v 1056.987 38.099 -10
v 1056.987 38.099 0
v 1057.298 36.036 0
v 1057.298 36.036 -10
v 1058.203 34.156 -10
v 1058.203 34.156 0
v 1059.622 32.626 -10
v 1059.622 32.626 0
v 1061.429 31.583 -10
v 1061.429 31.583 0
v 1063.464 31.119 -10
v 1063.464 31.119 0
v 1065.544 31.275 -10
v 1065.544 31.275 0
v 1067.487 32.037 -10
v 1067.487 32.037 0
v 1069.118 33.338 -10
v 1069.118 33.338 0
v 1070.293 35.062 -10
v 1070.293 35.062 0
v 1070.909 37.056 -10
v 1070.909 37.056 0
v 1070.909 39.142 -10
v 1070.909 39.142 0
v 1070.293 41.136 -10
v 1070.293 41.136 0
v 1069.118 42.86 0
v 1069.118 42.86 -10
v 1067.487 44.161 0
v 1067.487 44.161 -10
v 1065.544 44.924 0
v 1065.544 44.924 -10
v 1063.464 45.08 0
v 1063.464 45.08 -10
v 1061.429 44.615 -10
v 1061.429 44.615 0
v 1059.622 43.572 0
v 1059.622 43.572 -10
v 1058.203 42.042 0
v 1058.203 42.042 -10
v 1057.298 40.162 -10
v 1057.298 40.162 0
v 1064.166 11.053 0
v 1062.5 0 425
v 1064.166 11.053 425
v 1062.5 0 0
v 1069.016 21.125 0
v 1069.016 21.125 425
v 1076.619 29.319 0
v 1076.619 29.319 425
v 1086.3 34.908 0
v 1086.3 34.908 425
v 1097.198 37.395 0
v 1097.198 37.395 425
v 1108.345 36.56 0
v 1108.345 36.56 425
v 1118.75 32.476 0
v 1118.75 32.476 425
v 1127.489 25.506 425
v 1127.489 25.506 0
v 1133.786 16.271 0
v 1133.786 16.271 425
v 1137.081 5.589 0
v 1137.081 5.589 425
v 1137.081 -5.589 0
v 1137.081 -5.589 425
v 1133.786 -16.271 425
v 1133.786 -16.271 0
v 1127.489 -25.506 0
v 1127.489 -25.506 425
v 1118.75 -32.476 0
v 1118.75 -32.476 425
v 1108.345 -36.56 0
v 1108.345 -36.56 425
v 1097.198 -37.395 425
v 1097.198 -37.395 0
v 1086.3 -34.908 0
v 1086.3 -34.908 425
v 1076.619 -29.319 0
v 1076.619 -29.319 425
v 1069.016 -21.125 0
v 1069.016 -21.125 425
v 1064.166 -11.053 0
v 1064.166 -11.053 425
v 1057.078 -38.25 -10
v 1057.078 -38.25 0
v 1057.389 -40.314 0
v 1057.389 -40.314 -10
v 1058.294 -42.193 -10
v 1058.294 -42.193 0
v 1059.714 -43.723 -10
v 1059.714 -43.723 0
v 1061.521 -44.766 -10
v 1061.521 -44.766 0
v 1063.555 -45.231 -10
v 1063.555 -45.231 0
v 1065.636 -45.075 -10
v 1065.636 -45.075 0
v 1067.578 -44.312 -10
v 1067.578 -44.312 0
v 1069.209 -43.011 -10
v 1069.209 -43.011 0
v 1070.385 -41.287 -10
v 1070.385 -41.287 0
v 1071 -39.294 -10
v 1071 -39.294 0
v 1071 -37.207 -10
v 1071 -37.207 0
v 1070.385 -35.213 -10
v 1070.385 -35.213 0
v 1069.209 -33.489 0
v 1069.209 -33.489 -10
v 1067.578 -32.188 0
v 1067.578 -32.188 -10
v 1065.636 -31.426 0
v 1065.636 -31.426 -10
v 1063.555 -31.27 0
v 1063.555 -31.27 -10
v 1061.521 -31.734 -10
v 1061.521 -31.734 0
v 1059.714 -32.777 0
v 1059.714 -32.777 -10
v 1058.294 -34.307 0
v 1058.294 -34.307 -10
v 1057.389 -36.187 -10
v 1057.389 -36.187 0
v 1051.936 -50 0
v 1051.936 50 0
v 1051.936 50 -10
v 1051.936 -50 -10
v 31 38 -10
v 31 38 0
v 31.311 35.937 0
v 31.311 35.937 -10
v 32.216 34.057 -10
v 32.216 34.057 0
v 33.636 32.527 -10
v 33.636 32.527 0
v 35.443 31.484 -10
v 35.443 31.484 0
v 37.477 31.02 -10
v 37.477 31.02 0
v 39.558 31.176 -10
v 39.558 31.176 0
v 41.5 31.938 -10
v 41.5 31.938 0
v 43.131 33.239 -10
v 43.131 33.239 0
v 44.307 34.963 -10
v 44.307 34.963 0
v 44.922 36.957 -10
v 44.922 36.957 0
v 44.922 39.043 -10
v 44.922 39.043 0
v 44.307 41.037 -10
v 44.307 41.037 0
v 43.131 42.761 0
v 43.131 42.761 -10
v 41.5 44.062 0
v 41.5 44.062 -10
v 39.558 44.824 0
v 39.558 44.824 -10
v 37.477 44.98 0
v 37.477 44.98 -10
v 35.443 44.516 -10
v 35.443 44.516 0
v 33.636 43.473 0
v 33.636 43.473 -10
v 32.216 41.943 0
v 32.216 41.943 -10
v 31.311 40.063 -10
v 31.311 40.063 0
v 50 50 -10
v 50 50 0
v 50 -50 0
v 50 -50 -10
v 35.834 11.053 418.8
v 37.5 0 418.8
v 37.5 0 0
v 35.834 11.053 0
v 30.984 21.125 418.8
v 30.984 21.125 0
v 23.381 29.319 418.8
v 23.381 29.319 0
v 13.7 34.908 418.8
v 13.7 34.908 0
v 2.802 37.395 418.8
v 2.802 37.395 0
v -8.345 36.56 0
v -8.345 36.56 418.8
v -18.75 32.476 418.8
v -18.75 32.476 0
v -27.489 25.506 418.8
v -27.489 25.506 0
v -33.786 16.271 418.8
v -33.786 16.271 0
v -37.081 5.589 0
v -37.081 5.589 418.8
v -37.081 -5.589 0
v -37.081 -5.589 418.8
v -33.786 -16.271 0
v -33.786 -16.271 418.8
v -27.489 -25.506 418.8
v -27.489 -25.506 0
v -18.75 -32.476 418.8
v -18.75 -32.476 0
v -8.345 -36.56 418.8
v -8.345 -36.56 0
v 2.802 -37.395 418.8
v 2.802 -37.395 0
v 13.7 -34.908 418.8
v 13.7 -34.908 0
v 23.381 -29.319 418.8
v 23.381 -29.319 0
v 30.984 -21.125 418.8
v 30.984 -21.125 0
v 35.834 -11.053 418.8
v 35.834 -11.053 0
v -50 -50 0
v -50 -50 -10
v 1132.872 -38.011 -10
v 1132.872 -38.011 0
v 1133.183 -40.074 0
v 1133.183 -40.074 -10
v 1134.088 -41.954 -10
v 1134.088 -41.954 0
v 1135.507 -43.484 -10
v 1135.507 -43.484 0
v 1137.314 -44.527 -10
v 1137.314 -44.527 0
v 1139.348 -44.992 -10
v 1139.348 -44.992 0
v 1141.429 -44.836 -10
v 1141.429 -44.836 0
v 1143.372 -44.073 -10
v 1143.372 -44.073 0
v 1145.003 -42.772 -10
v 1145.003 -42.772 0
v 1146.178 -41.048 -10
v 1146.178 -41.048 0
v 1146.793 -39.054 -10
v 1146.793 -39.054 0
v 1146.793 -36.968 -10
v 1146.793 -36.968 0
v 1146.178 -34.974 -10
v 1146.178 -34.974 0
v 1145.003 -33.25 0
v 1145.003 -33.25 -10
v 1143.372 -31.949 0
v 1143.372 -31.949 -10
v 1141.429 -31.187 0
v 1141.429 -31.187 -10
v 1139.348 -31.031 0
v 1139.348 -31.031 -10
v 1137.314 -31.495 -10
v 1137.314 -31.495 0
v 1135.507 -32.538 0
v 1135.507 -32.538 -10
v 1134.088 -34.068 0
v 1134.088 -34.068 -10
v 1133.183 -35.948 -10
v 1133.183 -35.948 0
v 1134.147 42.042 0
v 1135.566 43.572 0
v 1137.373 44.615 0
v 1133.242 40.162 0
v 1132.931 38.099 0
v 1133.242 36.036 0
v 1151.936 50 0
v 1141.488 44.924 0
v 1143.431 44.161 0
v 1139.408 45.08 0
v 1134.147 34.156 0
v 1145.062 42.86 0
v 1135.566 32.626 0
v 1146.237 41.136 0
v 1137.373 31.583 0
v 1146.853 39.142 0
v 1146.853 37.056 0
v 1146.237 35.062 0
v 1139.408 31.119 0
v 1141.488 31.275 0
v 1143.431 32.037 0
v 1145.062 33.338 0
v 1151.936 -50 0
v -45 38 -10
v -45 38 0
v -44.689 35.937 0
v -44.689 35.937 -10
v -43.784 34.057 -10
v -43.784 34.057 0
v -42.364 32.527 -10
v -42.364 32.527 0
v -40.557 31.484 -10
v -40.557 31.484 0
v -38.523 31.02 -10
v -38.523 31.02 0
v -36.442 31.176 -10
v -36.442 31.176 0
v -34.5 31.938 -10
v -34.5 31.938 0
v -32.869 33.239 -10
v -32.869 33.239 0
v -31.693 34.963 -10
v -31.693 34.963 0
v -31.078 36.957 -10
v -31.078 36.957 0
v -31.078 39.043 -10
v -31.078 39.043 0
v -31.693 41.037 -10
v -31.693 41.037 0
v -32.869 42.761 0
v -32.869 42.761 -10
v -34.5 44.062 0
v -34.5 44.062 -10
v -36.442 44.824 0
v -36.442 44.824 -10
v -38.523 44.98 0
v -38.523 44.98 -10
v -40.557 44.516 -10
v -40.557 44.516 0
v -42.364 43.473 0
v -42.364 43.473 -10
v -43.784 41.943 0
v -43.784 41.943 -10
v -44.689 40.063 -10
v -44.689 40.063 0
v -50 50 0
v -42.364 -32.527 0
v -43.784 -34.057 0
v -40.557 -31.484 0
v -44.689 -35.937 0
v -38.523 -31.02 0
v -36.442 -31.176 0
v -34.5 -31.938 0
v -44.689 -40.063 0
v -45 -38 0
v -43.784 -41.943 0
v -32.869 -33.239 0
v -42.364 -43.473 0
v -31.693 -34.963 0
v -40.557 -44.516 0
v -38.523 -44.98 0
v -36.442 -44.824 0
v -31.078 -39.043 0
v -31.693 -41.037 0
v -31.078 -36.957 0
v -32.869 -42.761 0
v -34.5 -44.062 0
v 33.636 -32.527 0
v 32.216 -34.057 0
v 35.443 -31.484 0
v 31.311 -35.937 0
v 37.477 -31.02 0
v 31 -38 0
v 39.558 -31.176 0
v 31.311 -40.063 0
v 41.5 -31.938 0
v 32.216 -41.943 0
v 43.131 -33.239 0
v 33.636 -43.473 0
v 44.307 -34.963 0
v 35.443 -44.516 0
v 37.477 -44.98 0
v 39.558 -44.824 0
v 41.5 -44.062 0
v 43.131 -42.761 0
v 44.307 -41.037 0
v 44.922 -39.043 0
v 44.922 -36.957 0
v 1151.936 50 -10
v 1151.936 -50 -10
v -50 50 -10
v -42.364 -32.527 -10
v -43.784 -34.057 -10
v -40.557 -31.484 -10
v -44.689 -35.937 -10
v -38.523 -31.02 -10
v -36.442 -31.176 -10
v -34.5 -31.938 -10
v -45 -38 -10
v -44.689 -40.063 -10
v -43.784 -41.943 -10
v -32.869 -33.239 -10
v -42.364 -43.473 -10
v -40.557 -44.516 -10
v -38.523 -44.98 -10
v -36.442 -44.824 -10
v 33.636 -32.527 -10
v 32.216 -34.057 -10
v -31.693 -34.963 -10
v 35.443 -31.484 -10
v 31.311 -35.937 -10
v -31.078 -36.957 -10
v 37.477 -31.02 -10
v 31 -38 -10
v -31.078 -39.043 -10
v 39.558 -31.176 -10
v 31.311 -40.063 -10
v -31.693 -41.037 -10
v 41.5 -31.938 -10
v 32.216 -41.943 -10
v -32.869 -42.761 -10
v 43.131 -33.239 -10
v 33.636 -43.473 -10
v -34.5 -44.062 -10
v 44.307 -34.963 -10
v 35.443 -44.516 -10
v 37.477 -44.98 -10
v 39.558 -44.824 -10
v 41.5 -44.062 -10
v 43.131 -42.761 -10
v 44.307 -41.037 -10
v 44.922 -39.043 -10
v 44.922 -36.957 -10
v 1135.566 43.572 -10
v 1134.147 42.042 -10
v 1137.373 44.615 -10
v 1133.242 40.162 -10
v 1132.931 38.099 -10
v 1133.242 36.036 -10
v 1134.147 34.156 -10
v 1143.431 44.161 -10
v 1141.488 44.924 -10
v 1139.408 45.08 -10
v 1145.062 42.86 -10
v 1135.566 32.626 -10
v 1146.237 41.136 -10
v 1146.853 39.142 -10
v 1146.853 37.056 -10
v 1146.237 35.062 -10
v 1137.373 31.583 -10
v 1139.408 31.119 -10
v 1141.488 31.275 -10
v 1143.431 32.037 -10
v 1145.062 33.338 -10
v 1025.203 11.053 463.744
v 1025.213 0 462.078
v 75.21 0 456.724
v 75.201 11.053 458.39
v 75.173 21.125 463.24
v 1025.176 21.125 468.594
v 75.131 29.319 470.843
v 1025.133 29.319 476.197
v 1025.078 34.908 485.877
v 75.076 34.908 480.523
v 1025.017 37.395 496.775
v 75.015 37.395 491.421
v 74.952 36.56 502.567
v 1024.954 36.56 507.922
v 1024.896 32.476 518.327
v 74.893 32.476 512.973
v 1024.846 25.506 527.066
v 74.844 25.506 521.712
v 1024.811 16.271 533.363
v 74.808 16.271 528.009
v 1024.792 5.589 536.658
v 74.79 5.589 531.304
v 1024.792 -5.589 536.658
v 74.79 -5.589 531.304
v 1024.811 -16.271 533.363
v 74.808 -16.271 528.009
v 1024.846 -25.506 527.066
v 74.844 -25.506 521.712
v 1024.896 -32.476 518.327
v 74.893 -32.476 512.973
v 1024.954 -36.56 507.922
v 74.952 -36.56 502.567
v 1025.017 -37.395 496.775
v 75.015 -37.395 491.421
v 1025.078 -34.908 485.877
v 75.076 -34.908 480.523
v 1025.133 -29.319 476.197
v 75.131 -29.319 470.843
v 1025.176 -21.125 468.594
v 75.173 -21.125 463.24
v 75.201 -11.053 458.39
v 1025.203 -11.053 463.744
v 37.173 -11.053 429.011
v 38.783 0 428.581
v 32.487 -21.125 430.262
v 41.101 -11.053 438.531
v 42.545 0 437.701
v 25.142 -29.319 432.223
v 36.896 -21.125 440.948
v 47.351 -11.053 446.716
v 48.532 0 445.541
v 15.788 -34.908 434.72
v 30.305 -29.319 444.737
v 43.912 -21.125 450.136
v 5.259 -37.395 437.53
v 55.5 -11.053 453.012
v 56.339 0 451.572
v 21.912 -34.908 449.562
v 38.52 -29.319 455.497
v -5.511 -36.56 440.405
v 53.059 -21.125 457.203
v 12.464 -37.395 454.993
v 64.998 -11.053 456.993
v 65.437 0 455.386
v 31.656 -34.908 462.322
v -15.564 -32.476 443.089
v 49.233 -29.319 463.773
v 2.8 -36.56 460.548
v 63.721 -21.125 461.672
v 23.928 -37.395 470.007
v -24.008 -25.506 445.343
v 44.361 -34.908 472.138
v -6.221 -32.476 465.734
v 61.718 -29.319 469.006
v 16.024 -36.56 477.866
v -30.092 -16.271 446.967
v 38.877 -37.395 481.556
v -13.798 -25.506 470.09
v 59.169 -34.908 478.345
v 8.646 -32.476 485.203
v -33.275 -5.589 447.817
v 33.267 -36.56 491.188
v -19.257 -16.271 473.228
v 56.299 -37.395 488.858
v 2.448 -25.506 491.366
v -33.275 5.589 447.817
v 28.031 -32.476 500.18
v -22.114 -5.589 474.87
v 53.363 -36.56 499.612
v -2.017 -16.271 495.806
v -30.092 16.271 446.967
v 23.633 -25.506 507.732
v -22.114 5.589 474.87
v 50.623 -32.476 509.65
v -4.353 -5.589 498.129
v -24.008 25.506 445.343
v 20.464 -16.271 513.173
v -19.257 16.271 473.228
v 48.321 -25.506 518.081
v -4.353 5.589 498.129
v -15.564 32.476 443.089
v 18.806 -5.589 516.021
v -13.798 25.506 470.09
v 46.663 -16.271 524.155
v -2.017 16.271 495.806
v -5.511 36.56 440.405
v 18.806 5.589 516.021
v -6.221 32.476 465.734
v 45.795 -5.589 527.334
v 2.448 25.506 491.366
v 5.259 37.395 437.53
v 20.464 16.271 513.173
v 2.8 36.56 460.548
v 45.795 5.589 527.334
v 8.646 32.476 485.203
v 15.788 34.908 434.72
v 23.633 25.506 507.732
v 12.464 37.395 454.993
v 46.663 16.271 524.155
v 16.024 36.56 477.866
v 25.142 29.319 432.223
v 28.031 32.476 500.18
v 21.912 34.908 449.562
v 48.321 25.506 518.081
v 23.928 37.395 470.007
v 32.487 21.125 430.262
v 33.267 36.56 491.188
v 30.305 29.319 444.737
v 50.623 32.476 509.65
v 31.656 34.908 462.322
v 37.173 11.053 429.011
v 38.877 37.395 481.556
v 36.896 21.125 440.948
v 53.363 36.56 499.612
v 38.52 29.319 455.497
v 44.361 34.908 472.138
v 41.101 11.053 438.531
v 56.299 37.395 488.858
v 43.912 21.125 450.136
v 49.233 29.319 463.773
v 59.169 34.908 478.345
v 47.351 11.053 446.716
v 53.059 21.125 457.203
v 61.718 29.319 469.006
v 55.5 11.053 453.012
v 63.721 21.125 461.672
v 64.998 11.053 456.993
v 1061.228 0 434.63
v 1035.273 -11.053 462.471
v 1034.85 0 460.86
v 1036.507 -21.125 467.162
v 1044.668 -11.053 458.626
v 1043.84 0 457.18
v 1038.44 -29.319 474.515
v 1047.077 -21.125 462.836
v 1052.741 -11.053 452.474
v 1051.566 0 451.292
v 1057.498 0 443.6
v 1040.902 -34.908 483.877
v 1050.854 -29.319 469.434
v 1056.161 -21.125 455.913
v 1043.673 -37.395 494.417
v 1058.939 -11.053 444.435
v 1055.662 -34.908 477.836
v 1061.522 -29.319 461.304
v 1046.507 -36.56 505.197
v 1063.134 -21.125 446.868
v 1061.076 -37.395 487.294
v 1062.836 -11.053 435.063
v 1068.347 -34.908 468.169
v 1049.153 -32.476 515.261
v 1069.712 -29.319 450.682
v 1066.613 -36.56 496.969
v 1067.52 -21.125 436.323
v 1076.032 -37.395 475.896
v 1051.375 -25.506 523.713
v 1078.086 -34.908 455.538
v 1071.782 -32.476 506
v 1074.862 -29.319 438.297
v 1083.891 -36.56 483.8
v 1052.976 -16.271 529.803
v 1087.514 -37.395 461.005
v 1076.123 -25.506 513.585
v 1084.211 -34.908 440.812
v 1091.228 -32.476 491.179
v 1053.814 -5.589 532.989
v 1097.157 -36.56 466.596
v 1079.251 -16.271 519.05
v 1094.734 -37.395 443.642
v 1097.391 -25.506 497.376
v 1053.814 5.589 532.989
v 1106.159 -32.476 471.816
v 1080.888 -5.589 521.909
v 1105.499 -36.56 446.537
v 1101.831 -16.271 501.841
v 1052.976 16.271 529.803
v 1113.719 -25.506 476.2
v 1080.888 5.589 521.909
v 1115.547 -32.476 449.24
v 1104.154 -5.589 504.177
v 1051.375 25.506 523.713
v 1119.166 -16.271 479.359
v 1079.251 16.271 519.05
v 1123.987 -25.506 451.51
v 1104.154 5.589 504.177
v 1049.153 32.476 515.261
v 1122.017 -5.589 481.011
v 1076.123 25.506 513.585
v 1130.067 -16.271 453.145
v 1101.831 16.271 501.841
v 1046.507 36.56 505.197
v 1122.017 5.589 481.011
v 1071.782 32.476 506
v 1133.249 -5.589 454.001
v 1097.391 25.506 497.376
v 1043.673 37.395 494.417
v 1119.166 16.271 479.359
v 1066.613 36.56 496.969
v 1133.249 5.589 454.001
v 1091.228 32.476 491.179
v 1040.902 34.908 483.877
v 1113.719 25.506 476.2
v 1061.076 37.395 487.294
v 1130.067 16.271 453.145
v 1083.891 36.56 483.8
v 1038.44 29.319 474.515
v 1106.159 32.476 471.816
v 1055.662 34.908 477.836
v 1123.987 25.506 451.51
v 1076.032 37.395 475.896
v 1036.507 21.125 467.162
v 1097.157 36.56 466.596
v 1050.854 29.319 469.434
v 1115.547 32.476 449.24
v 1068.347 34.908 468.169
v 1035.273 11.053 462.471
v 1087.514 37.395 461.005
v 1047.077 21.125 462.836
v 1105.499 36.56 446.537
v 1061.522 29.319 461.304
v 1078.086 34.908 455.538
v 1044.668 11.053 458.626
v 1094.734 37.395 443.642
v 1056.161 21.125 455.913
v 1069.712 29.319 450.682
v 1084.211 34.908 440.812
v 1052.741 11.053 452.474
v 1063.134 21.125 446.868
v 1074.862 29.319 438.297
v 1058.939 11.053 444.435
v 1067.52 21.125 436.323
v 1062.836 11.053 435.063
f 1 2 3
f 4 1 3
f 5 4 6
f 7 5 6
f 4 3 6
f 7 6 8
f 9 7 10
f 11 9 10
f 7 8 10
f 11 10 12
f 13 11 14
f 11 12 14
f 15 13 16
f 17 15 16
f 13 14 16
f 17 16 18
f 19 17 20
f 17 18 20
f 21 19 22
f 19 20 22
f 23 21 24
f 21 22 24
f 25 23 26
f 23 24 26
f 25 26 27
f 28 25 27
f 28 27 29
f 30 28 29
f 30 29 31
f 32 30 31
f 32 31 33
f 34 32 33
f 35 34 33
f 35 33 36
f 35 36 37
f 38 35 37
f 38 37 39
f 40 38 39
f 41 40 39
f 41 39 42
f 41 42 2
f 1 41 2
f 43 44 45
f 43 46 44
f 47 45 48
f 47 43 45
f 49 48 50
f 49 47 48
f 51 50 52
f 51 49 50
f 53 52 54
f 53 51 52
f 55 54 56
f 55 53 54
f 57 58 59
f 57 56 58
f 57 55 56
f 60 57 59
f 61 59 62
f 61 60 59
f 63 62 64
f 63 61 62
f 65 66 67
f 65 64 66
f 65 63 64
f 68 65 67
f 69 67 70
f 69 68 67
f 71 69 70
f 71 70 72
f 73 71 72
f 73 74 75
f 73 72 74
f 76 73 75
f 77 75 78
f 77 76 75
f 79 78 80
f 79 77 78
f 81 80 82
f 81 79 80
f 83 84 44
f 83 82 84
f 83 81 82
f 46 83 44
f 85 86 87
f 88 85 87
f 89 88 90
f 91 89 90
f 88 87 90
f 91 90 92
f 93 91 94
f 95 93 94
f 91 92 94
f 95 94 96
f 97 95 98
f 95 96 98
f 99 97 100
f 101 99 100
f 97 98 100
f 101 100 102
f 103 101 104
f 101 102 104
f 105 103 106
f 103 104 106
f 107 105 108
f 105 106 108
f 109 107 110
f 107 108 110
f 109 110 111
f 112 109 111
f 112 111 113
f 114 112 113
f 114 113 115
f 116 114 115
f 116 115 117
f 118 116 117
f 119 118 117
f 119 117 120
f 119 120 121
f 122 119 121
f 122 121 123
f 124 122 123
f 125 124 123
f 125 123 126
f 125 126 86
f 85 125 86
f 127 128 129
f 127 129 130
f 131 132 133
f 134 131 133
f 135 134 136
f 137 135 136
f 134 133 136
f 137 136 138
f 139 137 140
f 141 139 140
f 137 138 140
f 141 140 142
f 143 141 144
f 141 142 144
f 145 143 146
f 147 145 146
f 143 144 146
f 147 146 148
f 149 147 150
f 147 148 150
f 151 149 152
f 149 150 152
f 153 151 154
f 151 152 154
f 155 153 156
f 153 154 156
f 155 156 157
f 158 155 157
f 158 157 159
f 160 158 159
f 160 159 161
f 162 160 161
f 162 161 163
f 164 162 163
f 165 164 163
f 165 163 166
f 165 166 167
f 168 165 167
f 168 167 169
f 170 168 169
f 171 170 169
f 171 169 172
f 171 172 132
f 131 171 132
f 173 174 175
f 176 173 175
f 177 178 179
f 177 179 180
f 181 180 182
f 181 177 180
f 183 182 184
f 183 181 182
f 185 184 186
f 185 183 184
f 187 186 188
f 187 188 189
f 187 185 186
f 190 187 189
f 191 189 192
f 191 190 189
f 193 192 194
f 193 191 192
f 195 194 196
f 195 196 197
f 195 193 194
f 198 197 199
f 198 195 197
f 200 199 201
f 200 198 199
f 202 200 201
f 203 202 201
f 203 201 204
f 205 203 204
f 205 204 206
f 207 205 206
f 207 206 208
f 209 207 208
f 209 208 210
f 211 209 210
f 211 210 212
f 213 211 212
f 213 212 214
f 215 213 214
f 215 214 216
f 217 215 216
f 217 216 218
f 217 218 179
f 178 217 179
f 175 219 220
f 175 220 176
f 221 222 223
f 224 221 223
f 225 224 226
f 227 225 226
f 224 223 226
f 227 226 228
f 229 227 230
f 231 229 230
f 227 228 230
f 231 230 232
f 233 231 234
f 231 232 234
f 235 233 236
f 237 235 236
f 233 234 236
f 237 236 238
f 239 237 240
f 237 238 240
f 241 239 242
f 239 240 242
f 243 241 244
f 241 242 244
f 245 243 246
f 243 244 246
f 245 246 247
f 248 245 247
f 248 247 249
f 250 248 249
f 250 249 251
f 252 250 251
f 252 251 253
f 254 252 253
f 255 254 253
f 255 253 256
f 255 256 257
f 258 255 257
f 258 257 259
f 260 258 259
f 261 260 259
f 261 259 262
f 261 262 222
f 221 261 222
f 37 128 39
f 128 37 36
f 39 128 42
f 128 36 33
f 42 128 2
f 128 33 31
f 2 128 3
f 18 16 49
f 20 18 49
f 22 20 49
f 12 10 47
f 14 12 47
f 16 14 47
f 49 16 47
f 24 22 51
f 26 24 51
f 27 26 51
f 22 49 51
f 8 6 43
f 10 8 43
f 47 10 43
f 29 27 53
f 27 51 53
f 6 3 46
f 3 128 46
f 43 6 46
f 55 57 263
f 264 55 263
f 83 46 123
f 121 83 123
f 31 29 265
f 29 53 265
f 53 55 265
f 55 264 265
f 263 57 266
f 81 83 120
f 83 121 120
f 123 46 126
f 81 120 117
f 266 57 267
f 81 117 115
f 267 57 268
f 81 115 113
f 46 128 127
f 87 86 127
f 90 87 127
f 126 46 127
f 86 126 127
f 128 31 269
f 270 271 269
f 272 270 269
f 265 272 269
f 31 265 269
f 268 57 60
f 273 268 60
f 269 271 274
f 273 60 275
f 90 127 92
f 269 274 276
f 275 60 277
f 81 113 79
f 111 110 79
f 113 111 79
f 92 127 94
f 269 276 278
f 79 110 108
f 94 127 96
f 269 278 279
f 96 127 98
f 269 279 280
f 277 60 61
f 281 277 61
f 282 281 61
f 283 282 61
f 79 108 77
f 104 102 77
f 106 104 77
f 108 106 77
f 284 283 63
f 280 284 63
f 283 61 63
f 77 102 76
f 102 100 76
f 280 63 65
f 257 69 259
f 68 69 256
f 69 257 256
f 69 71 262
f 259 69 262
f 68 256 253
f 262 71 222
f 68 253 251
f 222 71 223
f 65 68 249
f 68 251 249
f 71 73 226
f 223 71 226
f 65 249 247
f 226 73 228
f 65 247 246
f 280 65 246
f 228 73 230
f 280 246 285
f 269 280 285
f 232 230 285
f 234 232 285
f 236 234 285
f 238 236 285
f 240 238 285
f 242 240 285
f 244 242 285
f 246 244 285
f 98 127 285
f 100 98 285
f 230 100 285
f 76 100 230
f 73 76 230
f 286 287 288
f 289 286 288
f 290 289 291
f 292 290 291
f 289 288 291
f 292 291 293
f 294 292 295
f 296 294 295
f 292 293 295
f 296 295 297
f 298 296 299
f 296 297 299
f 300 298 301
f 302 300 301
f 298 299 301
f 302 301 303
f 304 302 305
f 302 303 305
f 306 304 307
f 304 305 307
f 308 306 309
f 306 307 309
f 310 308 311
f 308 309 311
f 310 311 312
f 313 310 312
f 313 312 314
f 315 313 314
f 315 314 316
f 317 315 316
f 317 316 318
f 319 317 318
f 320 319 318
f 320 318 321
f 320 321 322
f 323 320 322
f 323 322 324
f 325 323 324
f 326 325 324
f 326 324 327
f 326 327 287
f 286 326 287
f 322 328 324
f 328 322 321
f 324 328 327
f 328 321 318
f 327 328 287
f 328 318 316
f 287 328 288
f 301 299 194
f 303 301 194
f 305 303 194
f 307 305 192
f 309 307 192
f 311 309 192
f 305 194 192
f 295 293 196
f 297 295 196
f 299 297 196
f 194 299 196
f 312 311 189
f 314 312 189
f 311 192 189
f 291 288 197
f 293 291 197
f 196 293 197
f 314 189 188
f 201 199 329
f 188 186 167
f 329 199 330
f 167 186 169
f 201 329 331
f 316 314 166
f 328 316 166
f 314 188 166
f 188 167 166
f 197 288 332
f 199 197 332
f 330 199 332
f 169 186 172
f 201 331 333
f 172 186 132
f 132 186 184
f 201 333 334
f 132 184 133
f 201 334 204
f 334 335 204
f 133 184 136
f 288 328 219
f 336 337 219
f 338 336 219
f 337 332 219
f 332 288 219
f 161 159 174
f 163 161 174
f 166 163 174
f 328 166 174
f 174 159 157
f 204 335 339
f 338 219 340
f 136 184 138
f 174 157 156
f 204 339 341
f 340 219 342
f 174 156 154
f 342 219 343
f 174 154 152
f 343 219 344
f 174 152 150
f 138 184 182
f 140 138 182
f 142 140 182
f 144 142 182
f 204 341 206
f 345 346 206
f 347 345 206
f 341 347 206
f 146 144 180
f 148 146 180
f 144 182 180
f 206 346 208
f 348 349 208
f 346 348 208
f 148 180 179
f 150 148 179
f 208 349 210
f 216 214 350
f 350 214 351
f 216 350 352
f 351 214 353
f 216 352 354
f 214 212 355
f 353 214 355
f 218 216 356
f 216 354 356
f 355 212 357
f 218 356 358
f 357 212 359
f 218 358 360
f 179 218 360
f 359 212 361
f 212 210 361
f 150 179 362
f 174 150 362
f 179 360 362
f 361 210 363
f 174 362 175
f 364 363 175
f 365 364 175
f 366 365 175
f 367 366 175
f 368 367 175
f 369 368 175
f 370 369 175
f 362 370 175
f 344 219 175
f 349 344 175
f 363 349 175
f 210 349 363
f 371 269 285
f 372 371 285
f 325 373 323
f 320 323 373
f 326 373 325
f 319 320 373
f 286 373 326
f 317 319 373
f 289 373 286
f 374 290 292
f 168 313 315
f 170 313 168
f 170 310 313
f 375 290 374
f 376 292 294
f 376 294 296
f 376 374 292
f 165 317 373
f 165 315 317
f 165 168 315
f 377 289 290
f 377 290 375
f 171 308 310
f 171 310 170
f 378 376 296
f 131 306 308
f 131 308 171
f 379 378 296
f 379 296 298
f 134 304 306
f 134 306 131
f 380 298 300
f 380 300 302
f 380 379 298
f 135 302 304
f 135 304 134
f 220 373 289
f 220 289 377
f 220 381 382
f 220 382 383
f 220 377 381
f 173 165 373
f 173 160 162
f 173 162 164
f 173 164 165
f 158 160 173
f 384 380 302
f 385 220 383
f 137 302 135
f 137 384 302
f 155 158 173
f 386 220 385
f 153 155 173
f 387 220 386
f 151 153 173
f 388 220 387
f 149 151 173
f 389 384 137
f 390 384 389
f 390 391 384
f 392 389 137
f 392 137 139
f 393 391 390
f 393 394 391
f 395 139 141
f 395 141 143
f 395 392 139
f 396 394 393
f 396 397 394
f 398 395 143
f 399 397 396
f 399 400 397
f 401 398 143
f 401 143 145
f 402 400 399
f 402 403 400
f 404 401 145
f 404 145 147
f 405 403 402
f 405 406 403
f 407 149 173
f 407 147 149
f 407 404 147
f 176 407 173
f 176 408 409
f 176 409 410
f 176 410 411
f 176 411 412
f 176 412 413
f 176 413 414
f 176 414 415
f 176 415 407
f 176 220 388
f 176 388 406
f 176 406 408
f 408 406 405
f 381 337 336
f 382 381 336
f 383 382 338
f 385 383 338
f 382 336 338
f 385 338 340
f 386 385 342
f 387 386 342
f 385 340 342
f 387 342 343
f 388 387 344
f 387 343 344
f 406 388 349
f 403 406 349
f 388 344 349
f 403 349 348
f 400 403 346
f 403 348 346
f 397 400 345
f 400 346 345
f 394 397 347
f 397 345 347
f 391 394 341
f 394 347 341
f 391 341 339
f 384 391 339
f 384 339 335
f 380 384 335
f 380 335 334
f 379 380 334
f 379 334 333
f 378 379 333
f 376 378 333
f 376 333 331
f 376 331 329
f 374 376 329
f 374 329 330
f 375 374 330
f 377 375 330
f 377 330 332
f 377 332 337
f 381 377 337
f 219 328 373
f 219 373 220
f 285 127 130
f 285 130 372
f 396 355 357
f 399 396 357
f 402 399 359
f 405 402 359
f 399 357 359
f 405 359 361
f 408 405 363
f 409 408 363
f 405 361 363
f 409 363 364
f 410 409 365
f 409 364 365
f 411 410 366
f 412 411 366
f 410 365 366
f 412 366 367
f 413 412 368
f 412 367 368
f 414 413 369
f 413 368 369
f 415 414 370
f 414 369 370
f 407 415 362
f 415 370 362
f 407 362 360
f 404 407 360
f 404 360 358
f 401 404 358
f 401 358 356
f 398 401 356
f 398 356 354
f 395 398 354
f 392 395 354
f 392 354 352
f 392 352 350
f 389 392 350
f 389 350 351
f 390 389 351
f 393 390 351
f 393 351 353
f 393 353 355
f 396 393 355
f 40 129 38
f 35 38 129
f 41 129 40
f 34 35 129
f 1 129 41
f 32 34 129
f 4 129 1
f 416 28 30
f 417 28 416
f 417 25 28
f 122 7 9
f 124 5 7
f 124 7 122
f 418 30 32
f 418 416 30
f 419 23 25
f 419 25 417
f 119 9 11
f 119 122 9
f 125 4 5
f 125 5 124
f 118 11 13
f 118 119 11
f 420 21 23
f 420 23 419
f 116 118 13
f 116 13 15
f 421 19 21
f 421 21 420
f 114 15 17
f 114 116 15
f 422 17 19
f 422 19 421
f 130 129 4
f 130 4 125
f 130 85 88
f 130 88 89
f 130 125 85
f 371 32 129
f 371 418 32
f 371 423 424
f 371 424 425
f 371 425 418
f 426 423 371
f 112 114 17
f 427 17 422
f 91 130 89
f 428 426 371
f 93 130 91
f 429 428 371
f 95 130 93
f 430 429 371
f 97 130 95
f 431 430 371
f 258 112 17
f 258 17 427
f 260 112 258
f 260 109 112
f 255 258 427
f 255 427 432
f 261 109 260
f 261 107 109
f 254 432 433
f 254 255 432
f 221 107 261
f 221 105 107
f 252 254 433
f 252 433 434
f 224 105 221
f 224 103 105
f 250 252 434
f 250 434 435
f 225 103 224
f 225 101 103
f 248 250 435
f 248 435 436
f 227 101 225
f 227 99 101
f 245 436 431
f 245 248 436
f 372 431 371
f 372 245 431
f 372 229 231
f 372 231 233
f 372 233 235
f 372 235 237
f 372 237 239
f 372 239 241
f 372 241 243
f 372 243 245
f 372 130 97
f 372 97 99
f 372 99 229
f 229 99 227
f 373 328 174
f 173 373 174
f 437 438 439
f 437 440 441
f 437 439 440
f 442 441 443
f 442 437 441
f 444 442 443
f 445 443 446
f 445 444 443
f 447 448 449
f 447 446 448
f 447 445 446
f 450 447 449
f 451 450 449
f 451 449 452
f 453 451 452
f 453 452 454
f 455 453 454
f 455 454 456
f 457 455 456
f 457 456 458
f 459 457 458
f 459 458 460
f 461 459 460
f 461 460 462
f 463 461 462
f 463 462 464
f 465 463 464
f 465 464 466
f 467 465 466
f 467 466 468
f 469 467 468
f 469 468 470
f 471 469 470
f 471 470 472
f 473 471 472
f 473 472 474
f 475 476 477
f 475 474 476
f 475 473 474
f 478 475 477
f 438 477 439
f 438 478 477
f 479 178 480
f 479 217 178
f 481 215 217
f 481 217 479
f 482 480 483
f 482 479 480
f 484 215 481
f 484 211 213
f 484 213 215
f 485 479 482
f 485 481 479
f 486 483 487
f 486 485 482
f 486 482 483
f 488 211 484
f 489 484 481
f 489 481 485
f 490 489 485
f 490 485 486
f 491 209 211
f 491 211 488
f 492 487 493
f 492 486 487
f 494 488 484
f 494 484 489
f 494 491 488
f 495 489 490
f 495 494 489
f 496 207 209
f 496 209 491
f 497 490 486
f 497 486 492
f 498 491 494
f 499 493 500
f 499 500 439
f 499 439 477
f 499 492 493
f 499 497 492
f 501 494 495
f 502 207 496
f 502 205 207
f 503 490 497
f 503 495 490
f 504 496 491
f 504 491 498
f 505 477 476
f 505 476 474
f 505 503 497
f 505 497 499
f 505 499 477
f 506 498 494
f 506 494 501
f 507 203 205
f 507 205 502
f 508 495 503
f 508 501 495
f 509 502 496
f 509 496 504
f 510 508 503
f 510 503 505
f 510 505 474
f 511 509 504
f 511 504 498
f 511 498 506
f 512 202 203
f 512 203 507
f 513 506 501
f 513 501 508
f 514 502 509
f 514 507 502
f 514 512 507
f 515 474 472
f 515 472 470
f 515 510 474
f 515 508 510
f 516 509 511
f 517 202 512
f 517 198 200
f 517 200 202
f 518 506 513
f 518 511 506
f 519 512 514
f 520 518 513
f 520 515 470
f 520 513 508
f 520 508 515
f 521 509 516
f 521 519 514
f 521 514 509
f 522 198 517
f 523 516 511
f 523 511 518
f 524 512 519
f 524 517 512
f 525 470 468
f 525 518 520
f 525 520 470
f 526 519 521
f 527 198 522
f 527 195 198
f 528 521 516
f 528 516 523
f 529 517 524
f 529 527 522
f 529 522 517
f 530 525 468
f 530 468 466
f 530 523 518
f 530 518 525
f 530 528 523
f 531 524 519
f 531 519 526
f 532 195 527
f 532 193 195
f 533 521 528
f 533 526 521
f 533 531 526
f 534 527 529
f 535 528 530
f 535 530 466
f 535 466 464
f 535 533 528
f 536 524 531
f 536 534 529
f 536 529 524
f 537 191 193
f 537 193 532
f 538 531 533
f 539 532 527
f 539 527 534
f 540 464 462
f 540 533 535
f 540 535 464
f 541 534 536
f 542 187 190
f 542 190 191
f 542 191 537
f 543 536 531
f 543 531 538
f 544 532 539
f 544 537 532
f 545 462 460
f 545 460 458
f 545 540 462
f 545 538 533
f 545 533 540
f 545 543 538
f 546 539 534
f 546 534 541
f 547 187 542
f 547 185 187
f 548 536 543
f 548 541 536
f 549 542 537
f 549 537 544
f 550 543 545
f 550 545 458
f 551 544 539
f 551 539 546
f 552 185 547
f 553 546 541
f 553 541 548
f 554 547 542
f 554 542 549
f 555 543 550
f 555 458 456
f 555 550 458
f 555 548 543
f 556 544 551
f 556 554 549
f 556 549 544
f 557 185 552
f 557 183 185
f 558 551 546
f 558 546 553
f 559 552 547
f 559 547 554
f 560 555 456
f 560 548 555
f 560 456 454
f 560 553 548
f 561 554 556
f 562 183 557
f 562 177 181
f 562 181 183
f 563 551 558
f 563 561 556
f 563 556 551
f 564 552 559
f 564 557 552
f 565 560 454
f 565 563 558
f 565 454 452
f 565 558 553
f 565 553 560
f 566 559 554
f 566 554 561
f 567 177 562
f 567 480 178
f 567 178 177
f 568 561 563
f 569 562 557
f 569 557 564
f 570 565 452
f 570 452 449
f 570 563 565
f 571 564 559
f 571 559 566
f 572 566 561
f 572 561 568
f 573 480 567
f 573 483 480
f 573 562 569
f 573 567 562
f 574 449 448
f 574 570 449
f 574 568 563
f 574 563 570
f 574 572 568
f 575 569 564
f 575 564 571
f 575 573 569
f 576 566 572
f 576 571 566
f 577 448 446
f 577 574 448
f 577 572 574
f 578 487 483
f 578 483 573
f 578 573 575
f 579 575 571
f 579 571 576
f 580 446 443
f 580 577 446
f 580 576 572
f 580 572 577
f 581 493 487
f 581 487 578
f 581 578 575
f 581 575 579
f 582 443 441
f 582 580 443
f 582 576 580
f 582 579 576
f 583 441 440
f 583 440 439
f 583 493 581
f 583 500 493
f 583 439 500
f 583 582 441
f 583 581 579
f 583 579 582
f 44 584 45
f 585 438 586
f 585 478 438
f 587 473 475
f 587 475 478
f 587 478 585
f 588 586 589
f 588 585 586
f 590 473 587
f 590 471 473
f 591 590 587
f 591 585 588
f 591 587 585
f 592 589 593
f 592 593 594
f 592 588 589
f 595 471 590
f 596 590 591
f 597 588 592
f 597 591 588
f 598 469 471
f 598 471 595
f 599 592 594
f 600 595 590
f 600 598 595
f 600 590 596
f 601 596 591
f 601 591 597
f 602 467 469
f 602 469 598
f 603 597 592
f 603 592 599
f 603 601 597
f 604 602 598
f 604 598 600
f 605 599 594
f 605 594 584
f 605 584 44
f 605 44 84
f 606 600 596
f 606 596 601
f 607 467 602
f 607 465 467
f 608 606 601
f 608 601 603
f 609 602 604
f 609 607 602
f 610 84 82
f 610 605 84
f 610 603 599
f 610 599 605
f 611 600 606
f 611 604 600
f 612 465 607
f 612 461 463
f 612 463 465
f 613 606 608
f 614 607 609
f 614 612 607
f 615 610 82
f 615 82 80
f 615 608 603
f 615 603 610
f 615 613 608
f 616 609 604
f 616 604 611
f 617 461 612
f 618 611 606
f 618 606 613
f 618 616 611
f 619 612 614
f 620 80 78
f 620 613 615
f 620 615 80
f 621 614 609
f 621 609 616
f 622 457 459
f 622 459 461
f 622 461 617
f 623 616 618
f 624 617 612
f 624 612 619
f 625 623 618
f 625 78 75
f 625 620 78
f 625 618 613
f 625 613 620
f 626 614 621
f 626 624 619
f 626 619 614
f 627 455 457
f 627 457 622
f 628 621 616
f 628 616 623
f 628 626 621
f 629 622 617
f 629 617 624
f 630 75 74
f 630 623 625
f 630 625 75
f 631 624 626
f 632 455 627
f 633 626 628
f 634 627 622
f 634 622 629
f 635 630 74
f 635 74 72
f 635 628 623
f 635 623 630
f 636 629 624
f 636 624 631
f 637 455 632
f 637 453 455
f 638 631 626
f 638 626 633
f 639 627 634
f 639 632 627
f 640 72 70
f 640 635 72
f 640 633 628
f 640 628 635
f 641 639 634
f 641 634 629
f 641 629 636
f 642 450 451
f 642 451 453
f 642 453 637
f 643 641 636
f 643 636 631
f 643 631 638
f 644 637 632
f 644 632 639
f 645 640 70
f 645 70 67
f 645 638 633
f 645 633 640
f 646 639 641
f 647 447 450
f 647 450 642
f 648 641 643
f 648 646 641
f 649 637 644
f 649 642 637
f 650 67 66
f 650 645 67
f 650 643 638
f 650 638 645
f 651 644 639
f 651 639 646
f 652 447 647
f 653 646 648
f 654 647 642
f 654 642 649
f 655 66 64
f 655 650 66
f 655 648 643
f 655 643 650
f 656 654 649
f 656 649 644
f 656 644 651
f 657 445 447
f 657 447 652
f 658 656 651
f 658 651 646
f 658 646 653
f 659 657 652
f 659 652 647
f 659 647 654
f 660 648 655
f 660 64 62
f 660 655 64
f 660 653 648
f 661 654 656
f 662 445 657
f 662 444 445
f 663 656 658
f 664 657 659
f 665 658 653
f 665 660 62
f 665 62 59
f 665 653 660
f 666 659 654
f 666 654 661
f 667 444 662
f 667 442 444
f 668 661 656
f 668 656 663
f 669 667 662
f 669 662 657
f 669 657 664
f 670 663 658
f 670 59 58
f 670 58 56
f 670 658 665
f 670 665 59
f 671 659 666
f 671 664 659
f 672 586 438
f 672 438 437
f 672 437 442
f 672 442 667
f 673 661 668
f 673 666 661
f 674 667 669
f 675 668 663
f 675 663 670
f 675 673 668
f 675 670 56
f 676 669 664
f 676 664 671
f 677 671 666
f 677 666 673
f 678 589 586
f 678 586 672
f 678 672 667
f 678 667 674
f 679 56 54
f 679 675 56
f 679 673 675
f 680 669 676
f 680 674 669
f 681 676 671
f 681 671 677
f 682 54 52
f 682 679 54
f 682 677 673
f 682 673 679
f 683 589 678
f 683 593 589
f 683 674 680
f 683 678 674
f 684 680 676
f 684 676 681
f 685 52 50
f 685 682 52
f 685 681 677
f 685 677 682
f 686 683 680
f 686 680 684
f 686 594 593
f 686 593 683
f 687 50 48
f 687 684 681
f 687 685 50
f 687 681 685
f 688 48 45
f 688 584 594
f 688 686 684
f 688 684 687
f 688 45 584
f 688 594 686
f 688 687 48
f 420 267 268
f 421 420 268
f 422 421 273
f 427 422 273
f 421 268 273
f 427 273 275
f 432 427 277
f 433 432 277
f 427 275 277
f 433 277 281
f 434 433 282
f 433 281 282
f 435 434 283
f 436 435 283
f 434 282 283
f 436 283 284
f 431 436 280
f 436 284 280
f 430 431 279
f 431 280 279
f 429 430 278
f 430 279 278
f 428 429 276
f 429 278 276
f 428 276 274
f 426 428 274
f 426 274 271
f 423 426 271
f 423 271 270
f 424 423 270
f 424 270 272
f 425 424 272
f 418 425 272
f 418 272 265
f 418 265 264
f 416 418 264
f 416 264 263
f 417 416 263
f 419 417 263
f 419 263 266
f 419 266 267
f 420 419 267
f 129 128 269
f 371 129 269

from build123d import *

# Parameters (mm, degrees)
F0_R     = 37.5
F3_W     = 100
F3_H     = 100
F4_DEPTH = 10
F6_D     = 14
F6_DEPTH = 150


with BuildPart() as f2:
    # F2: sweep along a path in F1
    with BuildLine(Plane.XZ) as f2_path:
        Line((0, 0), (0, 418.800402))
        ThreePointArc((0, 418.800402), (21.941068, 471.982645), (74.998809, 494.223095))
        Line((74.998809, 494.223095), (1025.001191, 499.577307))
        ThreePointArc((1025.001191, 499.577307), (1078.007651, 477.883353), (1100, 425))
        Line((1100, 425), (1100, 0))
    # F0 (on Top) → F2 (sweep)
    with BuildSketch(Plane.XY):
        Circle(F0_R)
    sweep(path=f2_path.line)

    # F3 (on face) → F4 (join)
    with BuildSketch(Plane(origin=(0, 0, 0), x_dir=(1, 0, 0), z_dir=(0, 0, -1))):
        Rectangle(F3_W, F3_H)
        with Locations((1101.935744, 0)):
            Rectangle(F3_W, F3_H)
    extrude(amount=F4_DEPTH)

    # F6
    with Locations(Plane(origin=(0, 0, -10), x_dir=(1, 0, 0), z_dir=(0, 0, -1))):
        with Locations((-38, 38), (38, 38), (38, -38), (-38, -38), (1064.078009, 38.25024), (1139.871562, 38.011158), (1139.93069, -38.099146), (1063.986694, -38.099146)):
            Hole(F6_D / 2, depth=F6_DEPTH)


solid = f2.part
